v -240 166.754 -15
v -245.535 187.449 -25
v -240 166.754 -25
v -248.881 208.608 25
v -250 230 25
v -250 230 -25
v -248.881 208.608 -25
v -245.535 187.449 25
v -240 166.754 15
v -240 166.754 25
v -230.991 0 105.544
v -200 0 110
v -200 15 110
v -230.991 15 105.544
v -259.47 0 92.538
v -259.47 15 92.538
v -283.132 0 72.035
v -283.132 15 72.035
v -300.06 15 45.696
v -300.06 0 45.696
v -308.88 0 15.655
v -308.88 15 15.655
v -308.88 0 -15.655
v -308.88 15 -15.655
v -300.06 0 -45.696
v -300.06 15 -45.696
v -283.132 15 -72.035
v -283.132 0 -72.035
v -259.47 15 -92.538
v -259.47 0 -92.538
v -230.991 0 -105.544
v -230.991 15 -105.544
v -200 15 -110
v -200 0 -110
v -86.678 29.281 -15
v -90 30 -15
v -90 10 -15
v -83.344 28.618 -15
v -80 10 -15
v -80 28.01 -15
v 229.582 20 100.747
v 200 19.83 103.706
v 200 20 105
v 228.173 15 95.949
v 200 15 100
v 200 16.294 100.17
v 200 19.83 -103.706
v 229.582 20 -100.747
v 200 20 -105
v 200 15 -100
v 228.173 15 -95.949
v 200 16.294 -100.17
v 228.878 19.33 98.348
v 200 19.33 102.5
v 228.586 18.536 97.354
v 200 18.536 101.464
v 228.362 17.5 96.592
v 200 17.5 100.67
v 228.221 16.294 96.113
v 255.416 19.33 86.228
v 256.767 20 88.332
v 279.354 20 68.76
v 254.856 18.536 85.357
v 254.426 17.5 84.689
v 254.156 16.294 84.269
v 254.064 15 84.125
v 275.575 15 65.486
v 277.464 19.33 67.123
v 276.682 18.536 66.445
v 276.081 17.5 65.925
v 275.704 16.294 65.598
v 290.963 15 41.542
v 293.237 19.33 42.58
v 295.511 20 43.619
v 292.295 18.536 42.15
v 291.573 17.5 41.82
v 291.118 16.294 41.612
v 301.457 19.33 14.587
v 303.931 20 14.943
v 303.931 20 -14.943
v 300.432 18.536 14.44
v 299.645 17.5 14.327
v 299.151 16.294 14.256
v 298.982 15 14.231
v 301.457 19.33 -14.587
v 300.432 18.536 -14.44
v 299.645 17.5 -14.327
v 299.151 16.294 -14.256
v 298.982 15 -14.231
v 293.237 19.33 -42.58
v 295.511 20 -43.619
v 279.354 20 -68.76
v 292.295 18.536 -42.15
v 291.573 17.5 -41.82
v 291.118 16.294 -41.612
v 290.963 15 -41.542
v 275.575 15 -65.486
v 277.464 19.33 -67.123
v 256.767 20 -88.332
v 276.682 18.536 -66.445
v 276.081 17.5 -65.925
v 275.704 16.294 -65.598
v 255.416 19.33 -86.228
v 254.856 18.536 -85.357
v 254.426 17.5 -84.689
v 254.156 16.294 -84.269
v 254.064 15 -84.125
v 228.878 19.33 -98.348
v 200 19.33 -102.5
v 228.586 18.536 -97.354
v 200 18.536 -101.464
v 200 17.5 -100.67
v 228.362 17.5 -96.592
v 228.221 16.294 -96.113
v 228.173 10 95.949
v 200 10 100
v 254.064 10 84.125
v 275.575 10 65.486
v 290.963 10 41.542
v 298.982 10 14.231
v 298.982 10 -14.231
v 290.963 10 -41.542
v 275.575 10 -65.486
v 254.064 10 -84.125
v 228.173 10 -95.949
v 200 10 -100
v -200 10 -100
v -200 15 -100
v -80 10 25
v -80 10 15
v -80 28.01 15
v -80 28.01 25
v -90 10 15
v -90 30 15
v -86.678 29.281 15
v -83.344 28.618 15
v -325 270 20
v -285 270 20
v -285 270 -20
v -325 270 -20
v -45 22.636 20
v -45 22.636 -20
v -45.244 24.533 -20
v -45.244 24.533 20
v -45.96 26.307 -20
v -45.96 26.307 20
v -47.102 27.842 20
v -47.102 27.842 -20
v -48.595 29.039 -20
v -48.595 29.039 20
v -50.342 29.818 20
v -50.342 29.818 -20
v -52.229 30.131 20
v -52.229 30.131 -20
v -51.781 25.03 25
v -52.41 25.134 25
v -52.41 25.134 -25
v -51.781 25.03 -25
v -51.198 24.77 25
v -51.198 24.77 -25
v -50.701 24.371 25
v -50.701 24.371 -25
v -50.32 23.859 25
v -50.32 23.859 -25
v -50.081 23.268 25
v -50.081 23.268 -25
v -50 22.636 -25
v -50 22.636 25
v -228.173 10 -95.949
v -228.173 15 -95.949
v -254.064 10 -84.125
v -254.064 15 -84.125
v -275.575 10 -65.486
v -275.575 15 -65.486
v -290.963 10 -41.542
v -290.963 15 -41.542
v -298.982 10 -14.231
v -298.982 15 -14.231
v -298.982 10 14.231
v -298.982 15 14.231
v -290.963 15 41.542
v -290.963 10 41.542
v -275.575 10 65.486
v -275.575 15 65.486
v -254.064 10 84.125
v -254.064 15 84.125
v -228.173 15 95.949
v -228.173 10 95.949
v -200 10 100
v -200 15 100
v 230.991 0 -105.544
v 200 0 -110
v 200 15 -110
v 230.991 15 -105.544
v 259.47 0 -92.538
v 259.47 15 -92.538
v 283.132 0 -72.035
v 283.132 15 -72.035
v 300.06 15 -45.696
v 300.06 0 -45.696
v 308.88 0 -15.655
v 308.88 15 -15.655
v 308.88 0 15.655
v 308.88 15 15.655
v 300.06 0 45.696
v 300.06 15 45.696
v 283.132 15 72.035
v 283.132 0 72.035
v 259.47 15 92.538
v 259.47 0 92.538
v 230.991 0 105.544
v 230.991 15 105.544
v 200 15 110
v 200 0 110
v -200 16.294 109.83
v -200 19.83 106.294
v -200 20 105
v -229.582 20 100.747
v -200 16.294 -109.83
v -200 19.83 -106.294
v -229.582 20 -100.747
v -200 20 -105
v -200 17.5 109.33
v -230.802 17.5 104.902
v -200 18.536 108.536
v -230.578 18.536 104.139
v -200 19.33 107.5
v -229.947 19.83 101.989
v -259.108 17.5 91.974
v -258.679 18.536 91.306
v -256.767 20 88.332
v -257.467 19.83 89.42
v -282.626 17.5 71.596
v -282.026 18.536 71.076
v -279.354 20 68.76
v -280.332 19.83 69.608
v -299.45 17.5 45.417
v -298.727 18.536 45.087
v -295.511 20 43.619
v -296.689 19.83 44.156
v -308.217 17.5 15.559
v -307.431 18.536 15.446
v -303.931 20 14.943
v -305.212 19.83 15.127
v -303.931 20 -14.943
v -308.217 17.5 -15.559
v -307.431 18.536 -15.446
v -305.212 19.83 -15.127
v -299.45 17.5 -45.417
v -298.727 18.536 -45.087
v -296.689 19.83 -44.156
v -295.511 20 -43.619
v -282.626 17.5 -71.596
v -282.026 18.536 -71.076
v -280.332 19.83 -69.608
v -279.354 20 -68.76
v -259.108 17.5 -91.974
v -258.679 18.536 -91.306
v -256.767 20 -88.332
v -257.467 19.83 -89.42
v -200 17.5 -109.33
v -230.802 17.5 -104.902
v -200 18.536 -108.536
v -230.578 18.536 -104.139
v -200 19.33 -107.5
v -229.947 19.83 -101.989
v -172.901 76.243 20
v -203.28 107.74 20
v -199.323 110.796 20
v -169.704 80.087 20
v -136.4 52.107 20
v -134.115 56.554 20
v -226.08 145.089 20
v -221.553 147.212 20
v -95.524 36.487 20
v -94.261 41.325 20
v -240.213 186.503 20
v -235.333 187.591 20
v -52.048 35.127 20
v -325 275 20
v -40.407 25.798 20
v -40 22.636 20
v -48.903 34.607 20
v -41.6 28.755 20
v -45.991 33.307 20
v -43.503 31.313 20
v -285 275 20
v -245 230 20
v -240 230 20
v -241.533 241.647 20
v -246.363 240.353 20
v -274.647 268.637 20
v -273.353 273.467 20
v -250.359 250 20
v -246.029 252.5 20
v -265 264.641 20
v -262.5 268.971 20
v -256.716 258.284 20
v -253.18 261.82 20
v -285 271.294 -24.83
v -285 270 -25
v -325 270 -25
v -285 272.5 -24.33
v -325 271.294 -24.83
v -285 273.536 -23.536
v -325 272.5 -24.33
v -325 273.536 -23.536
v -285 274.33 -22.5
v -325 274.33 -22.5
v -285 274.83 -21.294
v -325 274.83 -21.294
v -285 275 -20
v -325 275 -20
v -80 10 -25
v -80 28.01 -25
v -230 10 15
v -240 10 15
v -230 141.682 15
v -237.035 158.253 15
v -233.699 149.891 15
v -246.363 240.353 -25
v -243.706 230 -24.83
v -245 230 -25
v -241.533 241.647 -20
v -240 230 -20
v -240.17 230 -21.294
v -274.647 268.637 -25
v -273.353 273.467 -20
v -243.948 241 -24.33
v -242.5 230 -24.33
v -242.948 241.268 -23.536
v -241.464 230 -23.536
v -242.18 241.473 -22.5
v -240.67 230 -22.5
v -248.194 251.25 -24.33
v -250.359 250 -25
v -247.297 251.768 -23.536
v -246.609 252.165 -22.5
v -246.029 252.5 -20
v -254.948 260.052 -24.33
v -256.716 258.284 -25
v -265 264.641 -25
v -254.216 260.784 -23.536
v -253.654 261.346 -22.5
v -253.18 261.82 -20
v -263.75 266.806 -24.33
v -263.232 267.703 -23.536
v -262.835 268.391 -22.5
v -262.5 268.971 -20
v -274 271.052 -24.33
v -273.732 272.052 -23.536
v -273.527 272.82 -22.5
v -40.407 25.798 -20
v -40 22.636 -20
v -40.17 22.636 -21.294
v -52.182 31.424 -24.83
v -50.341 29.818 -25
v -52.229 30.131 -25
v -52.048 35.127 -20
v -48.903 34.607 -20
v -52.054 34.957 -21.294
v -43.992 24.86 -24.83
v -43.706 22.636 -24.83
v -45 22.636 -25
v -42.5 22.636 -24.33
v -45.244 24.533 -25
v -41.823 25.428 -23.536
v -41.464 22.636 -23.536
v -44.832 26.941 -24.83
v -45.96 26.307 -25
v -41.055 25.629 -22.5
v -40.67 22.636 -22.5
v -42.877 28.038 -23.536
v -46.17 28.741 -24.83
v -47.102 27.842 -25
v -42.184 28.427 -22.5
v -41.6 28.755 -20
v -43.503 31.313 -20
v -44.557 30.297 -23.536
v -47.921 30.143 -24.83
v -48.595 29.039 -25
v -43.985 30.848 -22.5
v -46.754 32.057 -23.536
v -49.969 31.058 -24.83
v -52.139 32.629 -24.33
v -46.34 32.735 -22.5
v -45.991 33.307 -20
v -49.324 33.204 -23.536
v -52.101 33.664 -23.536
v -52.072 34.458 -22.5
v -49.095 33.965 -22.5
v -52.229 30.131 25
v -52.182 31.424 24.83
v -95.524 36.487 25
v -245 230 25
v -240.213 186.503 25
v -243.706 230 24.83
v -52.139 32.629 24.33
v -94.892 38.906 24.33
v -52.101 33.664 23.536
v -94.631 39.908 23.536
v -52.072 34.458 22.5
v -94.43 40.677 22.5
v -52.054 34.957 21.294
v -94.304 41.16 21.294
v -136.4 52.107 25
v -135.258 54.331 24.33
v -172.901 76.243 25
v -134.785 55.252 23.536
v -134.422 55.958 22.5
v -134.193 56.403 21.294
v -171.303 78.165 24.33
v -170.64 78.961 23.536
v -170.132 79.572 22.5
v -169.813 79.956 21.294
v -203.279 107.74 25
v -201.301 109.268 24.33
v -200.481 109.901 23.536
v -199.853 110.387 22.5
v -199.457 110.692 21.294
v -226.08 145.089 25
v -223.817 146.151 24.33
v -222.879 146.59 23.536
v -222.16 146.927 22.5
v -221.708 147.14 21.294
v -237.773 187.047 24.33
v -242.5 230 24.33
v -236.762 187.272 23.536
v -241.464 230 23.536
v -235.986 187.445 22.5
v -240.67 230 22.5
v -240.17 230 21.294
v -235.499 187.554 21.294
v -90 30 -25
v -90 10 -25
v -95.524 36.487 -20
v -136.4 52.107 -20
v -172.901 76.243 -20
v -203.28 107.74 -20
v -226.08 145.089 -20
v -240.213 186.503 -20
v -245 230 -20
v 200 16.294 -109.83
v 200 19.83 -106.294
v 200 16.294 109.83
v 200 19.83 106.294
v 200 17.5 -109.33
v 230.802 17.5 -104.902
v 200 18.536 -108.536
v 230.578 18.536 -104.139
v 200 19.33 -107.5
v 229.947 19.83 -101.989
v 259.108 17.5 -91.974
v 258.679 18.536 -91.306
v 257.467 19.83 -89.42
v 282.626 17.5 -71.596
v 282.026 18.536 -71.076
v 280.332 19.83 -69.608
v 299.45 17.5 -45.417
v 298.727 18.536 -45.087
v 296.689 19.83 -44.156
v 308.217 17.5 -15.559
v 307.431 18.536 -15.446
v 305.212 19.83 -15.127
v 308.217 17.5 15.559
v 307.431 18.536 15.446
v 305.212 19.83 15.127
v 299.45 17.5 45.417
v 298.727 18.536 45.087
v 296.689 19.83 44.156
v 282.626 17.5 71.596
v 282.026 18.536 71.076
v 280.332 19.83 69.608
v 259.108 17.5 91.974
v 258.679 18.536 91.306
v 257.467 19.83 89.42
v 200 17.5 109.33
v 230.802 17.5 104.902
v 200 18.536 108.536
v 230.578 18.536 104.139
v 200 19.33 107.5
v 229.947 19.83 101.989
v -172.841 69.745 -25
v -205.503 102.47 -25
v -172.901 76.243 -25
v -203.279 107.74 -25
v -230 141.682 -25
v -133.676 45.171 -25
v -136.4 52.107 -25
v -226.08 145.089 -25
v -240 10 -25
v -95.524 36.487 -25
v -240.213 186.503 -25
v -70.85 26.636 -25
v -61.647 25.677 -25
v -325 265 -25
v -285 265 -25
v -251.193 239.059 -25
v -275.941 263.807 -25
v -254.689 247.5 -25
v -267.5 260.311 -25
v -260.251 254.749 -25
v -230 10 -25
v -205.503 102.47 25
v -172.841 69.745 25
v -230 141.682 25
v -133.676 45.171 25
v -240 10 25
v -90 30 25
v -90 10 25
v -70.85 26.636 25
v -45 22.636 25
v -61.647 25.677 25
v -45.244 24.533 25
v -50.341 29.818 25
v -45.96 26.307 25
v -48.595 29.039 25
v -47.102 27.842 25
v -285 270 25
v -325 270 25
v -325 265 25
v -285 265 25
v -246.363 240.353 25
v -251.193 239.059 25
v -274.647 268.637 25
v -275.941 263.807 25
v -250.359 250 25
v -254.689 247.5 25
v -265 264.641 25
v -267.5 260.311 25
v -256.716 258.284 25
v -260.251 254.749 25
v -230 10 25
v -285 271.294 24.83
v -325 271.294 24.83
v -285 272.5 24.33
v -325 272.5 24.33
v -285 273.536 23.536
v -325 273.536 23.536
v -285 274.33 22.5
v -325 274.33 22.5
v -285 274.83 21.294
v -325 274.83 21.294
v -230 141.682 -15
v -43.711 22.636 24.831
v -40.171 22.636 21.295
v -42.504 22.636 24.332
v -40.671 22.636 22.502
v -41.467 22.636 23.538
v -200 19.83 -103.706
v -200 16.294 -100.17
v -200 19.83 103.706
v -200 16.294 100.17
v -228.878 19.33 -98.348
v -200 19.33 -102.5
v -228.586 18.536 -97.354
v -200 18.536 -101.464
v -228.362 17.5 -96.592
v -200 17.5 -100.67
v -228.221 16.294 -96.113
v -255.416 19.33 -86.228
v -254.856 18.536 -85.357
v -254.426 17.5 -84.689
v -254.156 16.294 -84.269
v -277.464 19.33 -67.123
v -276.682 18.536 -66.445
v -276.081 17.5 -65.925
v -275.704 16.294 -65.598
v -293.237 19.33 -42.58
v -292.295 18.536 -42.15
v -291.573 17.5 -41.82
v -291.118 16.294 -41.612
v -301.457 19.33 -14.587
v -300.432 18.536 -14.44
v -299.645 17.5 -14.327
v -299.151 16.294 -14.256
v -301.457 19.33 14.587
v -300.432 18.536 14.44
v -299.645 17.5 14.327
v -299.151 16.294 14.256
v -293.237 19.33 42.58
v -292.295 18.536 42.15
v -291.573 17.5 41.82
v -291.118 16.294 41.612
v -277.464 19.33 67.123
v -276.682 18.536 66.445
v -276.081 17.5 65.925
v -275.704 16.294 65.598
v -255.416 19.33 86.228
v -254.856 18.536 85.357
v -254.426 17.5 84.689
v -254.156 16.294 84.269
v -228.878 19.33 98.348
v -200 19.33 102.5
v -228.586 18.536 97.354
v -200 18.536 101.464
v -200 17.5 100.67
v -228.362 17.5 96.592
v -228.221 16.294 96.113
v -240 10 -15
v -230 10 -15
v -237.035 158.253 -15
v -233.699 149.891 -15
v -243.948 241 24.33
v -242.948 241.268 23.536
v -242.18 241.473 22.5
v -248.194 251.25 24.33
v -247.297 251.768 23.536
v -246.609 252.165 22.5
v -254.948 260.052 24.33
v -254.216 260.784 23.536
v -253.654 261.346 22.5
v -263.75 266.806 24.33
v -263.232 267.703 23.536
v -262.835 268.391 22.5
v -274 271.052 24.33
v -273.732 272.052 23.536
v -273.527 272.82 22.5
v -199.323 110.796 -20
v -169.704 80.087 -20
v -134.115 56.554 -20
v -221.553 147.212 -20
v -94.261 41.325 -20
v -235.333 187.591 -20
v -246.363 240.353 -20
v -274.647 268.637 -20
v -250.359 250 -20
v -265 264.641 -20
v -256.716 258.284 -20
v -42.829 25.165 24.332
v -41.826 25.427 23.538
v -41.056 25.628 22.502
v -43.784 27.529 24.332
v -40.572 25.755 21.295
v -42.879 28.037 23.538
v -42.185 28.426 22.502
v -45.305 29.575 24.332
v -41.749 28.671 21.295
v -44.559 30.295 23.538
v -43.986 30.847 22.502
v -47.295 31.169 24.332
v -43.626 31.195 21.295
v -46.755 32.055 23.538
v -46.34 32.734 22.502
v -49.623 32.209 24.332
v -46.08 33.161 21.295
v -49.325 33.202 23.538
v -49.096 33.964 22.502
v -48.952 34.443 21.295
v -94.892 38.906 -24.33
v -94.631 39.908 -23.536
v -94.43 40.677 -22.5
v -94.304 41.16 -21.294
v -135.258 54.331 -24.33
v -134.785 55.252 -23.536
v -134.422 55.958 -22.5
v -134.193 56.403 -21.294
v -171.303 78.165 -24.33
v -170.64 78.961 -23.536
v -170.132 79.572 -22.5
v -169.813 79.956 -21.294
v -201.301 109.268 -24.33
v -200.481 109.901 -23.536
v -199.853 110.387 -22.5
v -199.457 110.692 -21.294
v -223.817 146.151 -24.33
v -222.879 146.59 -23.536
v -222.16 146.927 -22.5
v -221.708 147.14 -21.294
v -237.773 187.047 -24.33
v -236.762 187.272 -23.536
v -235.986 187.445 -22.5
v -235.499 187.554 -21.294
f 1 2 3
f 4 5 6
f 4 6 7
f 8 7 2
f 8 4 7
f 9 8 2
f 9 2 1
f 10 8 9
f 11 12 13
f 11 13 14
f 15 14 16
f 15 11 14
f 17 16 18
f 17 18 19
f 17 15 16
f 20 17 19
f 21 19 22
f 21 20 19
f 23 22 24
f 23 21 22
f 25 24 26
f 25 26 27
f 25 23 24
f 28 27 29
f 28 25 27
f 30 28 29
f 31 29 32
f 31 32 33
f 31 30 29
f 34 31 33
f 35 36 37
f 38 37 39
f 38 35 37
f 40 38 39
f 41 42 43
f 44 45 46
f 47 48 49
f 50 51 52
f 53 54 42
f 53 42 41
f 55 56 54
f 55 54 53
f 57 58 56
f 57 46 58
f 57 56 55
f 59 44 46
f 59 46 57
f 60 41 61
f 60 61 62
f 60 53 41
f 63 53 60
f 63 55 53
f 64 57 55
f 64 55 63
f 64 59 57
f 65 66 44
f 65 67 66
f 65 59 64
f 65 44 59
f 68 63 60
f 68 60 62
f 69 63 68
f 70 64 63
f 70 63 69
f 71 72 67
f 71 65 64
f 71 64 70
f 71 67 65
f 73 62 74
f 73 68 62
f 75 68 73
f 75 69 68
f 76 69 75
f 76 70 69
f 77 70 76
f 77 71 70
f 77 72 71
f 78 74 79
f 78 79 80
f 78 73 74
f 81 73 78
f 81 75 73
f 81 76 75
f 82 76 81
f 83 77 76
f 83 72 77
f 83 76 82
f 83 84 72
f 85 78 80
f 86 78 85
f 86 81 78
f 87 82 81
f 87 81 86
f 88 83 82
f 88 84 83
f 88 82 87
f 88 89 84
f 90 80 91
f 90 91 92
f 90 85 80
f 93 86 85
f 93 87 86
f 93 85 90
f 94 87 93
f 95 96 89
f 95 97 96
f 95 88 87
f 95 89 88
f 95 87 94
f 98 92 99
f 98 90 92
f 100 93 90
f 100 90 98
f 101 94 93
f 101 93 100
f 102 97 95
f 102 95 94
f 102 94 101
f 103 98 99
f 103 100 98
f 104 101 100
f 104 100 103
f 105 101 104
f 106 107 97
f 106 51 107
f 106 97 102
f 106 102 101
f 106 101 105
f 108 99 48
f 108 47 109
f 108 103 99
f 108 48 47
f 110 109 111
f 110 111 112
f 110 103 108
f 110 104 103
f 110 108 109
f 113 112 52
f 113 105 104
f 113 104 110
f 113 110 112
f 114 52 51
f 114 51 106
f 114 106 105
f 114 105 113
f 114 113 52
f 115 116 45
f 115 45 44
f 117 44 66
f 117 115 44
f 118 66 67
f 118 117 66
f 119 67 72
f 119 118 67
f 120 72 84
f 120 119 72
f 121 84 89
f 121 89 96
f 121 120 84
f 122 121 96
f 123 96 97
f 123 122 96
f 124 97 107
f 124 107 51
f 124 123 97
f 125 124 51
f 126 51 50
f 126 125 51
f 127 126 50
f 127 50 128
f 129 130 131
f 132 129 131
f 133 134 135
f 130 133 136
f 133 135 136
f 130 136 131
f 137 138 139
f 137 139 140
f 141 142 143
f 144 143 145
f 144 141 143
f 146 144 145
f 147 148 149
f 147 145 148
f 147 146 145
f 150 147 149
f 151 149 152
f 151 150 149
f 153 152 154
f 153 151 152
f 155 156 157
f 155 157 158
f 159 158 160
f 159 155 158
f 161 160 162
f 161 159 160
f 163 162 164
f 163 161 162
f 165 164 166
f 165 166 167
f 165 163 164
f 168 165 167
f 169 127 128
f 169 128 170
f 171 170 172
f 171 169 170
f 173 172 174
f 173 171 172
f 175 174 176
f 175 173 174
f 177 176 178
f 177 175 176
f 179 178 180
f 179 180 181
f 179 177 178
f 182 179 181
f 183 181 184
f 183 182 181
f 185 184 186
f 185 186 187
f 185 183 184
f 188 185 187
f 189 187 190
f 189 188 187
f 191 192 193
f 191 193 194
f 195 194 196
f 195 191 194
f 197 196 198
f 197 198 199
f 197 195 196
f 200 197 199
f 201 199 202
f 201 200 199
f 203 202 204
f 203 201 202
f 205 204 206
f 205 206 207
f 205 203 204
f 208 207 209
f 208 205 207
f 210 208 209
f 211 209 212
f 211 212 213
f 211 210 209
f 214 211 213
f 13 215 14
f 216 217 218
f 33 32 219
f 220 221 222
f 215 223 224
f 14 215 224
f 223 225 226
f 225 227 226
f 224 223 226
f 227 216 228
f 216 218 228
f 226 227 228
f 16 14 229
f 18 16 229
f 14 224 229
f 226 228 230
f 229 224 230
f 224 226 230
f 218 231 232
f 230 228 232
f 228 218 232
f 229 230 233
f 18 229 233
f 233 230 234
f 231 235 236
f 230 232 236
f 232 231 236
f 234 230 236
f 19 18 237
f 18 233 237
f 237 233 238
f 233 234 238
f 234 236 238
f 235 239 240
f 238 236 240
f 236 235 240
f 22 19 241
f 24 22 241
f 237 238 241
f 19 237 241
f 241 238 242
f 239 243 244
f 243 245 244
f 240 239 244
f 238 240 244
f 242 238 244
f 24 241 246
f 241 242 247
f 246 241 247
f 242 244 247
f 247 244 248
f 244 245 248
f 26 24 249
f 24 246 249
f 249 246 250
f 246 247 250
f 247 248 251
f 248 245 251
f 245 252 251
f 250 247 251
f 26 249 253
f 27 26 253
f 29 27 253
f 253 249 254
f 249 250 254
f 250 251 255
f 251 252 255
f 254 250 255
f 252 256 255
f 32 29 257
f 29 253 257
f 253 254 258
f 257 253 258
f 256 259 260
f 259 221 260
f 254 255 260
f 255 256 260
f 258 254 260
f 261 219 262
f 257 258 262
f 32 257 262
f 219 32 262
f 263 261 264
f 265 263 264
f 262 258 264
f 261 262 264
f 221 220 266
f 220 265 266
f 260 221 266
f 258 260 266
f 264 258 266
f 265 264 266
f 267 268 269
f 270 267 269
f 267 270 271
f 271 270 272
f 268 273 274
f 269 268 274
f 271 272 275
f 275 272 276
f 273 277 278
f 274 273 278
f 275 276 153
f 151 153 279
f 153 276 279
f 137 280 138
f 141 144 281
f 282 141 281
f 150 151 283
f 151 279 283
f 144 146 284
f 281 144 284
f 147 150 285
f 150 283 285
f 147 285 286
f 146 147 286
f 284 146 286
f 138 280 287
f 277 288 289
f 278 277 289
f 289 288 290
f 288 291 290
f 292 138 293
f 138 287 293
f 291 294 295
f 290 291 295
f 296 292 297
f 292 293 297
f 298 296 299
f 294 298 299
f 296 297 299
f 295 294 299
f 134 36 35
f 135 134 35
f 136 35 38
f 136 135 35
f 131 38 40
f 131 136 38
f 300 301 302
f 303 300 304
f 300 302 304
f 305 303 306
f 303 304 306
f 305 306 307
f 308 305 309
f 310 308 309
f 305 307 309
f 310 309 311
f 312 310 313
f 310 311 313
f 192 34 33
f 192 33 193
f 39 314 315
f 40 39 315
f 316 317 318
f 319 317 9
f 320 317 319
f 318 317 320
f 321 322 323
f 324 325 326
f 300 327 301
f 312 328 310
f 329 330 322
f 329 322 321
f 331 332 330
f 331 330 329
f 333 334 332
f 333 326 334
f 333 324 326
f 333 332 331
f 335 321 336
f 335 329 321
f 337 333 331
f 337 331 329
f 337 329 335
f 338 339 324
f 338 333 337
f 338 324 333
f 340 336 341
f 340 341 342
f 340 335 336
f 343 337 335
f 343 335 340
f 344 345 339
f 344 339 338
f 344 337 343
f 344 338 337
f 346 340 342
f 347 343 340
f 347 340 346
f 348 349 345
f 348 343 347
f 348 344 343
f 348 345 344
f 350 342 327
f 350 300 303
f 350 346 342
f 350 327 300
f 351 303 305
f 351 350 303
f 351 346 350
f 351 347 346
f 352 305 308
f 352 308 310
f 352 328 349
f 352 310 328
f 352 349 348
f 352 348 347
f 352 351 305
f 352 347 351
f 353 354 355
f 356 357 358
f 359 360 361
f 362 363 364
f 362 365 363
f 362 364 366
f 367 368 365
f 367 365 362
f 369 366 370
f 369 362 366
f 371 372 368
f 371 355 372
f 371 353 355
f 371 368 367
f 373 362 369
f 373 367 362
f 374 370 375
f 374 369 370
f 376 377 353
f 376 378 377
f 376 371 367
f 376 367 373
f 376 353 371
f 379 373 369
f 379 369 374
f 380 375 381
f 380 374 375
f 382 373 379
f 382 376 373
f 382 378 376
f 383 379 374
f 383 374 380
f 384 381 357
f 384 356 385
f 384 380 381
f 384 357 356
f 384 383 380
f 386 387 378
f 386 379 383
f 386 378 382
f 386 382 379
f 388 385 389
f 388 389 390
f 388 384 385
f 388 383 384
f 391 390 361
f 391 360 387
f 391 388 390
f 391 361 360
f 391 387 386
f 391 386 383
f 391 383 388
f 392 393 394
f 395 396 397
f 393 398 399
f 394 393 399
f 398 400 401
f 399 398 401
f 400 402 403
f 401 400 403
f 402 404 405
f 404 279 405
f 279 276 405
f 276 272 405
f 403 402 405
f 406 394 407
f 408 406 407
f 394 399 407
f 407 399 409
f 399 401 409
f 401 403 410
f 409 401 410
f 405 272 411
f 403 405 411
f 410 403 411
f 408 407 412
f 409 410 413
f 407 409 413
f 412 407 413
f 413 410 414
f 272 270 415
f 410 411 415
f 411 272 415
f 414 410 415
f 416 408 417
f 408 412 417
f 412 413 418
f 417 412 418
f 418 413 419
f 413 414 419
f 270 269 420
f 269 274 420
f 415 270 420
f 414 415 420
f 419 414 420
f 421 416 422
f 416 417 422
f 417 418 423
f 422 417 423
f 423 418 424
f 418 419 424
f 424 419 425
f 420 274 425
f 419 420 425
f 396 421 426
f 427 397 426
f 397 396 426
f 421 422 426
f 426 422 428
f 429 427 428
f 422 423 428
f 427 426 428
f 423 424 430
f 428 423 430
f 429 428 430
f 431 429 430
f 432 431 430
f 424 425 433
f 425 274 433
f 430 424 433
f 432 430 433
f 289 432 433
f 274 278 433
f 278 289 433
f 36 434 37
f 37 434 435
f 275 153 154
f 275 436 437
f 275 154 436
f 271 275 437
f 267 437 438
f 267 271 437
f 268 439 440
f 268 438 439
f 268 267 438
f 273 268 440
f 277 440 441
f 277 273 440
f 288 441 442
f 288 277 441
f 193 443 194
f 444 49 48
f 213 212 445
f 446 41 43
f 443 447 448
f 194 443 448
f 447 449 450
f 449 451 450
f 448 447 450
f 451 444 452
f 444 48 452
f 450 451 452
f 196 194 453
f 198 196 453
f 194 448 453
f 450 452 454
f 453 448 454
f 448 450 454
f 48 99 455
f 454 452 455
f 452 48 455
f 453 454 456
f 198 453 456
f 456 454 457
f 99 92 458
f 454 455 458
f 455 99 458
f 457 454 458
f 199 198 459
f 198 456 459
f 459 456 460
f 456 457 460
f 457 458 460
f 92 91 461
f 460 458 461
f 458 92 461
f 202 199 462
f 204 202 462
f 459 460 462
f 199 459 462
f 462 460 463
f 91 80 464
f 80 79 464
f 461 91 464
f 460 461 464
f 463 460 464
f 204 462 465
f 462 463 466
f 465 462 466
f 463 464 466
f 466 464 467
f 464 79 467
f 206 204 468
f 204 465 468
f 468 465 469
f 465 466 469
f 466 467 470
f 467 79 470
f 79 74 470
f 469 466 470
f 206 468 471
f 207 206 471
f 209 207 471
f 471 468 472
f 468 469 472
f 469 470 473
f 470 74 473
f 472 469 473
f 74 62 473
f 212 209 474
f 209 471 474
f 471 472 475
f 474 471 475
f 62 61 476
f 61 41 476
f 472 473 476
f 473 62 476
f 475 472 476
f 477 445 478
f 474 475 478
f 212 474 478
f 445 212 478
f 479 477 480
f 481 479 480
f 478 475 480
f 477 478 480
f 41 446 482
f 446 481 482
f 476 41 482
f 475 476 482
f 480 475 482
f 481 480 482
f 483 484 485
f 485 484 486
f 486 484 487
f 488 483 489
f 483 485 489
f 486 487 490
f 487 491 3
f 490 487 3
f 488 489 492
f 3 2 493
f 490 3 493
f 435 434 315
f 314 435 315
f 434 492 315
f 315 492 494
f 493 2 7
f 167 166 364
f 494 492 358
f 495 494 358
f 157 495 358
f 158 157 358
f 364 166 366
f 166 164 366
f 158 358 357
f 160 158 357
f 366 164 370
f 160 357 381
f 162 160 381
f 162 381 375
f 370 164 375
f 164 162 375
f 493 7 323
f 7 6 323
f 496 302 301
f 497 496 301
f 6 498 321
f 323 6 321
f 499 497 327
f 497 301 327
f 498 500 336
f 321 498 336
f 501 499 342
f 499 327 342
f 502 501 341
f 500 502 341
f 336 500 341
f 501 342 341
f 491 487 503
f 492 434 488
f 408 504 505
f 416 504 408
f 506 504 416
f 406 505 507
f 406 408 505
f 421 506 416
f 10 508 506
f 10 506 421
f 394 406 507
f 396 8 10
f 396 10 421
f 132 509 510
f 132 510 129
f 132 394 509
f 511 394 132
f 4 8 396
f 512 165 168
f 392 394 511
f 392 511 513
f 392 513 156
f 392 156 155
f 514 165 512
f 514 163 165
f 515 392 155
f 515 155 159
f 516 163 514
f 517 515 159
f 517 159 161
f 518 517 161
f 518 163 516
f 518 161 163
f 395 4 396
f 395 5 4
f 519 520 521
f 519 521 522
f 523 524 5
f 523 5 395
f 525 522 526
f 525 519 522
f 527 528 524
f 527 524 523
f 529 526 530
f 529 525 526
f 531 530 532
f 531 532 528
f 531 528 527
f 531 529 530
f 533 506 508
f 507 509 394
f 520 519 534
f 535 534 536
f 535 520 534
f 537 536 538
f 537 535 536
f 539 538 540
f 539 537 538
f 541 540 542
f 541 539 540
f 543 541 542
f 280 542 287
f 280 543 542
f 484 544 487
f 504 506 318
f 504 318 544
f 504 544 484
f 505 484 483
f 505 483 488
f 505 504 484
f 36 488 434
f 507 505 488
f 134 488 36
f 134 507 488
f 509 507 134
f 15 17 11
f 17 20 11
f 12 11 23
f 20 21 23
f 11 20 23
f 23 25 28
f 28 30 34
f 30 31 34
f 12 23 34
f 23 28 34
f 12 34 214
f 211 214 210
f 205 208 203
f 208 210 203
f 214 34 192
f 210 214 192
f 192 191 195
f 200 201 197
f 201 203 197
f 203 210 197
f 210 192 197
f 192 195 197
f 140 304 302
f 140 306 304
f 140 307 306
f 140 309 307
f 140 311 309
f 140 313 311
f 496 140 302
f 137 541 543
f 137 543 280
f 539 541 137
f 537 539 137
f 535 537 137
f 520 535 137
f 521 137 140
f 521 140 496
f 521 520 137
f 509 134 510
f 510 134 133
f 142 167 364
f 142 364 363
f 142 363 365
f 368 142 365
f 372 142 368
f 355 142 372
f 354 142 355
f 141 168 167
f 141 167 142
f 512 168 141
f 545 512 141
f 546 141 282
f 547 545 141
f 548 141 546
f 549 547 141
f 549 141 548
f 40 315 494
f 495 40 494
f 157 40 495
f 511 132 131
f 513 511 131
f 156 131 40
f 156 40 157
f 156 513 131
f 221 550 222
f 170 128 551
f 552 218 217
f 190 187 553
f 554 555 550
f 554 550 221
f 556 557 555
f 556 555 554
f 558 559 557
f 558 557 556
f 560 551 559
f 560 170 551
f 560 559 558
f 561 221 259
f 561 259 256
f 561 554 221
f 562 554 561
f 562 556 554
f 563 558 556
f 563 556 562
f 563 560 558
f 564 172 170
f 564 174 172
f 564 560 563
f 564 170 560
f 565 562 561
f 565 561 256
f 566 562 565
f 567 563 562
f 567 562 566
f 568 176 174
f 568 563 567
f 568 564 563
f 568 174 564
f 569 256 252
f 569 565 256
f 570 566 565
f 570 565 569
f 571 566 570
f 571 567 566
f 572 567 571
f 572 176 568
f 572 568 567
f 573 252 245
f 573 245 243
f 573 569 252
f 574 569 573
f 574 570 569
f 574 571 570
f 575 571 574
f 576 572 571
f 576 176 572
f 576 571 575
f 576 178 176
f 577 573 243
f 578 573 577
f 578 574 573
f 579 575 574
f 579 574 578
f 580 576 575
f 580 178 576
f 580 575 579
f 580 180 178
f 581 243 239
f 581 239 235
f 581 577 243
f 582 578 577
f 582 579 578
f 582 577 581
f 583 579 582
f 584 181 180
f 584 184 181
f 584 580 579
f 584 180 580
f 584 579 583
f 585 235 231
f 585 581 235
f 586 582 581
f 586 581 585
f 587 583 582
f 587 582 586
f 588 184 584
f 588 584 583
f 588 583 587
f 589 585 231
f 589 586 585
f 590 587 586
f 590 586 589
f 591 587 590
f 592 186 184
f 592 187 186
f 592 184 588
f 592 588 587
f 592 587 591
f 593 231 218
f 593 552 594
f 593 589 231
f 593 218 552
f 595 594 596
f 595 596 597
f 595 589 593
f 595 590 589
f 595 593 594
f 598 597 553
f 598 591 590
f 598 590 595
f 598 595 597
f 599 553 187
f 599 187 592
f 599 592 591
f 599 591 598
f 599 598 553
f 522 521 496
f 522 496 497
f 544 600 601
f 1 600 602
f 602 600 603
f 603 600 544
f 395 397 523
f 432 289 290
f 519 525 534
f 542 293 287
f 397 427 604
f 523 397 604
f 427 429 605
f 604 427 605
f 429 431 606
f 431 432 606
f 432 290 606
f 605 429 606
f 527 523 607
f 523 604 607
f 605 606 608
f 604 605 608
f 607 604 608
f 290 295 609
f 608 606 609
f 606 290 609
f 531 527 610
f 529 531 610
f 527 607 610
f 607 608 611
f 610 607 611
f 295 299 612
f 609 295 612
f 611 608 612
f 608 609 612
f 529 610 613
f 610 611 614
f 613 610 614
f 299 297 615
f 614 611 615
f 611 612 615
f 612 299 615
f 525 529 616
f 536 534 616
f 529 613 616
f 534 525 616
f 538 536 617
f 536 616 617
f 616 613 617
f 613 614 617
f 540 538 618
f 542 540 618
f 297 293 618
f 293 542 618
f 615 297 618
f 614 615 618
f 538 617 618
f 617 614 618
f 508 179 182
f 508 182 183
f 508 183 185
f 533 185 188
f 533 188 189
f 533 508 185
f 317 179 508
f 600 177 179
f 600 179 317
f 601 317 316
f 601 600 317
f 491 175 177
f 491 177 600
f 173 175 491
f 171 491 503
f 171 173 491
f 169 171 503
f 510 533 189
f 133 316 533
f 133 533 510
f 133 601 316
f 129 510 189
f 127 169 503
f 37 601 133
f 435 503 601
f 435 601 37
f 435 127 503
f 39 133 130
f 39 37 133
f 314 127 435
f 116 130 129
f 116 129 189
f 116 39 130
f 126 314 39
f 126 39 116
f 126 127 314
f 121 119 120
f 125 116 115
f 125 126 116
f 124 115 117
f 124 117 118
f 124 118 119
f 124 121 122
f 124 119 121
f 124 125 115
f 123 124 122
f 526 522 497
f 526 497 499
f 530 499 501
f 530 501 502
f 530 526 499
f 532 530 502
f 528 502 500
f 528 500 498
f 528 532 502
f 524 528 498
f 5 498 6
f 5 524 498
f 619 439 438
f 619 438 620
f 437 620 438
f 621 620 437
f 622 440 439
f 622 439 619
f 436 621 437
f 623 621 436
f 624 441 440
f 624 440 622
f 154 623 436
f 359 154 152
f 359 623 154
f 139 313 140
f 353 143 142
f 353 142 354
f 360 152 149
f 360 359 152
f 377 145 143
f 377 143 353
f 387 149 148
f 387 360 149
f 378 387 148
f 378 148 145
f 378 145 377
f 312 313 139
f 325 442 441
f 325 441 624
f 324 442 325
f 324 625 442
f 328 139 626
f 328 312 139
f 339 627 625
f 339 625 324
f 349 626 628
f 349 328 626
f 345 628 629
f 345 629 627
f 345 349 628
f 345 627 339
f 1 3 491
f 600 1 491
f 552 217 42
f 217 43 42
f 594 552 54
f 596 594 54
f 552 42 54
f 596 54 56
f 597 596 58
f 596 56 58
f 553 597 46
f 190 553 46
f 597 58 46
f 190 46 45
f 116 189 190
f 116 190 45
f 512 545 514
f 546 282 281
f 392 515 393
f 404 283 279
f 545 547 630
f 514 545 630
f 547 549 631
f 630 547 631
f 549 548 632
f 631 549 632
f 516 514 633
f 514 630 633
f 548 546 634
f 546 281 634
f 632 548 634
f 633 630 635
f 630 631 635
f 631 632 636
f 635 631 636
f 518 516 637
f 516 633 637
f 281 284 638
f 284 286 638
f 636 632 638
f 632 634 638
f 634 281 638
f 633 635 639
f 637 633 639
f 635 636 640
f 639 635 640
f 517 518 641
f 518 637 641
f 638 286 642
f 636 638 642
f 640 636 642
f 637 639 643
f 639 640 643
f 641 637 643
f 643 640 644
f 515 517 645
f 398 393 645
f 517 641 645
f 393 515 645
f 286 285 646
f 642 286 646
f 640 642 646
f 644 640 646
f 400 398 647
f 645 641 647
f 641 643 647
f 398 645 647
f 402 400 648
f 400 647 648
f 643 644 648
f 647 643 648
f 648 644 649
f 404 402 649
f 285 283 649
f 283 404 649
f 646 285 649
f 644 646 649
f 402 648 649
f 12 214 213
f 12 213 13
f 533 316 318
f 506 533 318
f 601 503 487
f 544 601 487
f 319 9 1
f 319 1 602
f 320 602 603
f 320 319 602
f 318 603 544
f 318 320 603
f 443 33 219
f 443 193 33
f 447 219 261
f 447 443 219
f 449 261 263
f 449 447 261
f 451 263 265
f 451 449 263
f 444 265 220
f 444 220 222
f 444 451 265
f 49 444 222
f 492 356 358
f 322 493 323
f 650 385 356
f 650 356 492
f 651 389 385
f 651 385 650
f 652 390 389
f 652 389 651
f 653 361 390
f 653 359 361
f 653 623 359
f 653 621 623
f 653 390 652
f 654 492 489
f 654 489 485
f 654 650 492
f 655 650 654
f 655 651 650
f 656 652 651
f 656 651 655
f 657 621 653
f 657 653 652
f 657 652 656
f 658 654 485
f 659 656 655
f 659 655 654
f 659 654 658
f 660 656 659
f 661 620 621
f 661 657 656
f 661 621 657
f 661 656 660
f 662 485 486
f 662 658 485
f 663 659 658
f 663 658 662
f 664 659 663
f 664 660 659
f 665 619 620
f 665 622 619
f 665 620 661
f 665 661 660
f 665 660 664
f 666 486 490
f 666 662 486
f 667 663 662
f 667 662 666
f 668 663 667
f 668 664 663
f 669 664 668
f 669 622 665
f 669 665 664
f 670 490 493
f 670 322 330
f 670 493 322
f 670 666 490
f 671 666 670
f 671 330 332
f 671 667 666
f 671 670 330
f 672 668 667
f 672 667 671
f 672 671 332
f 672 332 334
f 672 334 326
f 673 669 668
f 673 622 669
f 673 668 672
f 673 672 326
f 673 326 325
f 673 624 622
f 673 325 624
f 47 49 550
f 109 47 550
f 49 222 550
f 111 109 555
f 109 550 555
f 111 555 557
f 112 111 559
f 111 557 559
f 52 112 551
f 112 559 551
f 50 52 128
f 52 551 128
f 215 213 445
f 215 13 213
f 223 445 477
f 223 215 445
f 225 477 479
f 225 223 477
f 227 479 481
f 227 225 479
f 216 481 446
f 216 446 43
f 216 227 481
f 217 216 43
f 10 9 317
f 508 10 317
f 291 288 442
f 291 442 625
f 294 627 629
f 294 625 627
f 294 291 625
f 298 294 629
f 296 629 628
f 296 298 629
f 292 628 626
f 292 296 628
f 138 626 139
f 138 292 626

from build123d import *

# Parameters (mm, degrees)
SKETCH_1_W      = 4
SKETCH_1_H      = 6
EXTRUDE_1_DEPTH = 10
EXTRUDE_2_DEPTH = 20
SKETCH_1_4_W    = 4
SKETCH_1_4_H    = 6
EXTRUDE_3_DEPTH = 10
FILLET_1_R      = 5
EXTRUDE_4_DEPTH = 25
EXTRUDE_START   = 25
EXTRUDE_5_DEPTH = 5
EXTRUDE_START_2 = -25
EXTRUDE_6_DEPTH = 5
EXTRUDE_START_3 = 15
EXTRUDE_7_DEPTH = 10
EXTRUDE_8_DEPTH = 10
FILLET_2_R      = 5


with BuildPart() as part:
    # Эскиз1 → Бобышка-Вытянуть1 (new body)
    with BuildSketch(Plane(origin=(0, 0, 0), x_dir=(1, 0, 0), z_dir=(0, 1, 0))):
        with BuildLine():
            Line((-200, -100), (200, -100))
            ThreePointArc((200, -100), (300, 0), (200, 100))
            Line((200, 100), (-200, 100))
            ThreePointArc((-200, 100), (-300, 0), (-200, -100))
        make_face()
        with Locations((-242, 18)):
            Rectangle(SKETCH_1_W, SKETCH_1_H, mode=Mode.SUBTRACT)
        with Locations((-242, -18)):
            Rectangle(SKETCH_1_W, SKETCH_1_H, mode=Mode.SUBTRACT)
    extrude(amount=EXTRUDE_1_DEPTH)

    # Эскиз1<3> → Бобышка-Вытянуть2 (add)
    with BuildSketch(Plane(origin=(0, 0, 0), x_dir=(1, 0, 0), z_dir=(0, 1, 0))):
        with BuildLine():
            Line((-200, 110), (200, 110))
            ThreePointArc((200, 110), (310, 0), (200, -110))
            Line((200, -110), (-200, -110))
            ThreePointArc((-200, -110), (-310, 0), (-200, 110))
        make_face()
        with BuildLine():
            ThreePointArc((200, -100), (300, 0), (200, 100))
            Line((200, 100), (-200, 100))
            ThreePointArc((-200, 100), (-300, 0), (-200, -100))
            Line((-200, -100), (200, -100))
        make_face(mode=Mode.SUBTRACT)
    extrude(amount=EXTRUDE_2_DEPTH)

    # Эскиз1<4> → Бобышка-Вытянуть3 (add)
    with BuildSketch(Plane(origin=(0, 0, 0), x_dir=(1, 0, 0), z_dir=(0, 1, 0))):
        with Locations((-242, 18)):
            Rectangle(SKETCH_1_4_W, SKETCH_1_4_H)
        with Locations((-242, -18)):
            Rectangle(SKETCH_1_4_W, SKETCH_1_4_H)
    extrude(amount=EXTRUDE_3_DEPTH)

    # Скругление1
    fillet_1_edges = [part.edges().sort_by_distance(p)[0] for p in [
        (0, 20, -110),
        (300, 20, 0),
        (0, 20, 100),
        (-300, 20, 0),
        (0, 20, -100),
        (-310, 20, 0),
        (0, 20, 110),
        (310, 20, 0),
    ]]
    fillet(fillet_1_edges, radius=FILLET_1_R - 0.0001)  # a hair under: the kernel refuses the full size



with BuildPart() as body_2:
    # Эскиз2 → Бобышка-Вытянуть4 (new, symmetric)
    with BuildSketch(Plane.XY):
        with BuildLine():
            ThreePointArc((-245, 230), (-256.715728753, 258.284271247), (-285, 270))
            Line((-285, 270), (-325, 270))
            Line((-325, 270), (-325, 265))
            Line((-325, 265), (-285, 265))
            ThreePointArc((-285, 265), (-260.251262658, 254.748737342), (-250, 230))
            ThreePointArc((-250, 230), (-247.484567313, 197.984378813), (-240, 166.754446797))
            ThreePointArc((-240, 166.754446797), (-235.413108769, 154.053650458), (-230, 141.682391337))
            ThreePointArc((-230, 141.682391337), (-172.840678712, 69.744700973), (-90, 30))
            ThreePointArc((-90, 30), (-85.012374627, 28.942769648), (-80, 28.009901233))
            ThreePointArc((-80, 28.009901233), (-66.253520421, 26.104713469), (-52.409638554, 25.133952895))
            ThreePointArc((-52.409638554, 25.133952895), (-50.700569032, 24.371111803), (-50, 22.635586467))
            Line((-50, 22.635586467), (-45, 22.635586467))
            ThreePointArc((-45, 22.635586467), (-47.101707097, 27.842162475), (-52.228915663, 30.130685751))
            ThreePointArc((-52.228915663, 30.130685751), (-188.95447741, 91.1579731), (-245, 230))
        make_face()
    extrude(amount=EXTRUDE_4_DEPTH, both=True)


with BuildPart() as body_3:
    # Эскиз2<4> → Бобышка-Вытянуть5 (new body)
    with BuildSketch(Plane.XY.offset(EXTRUDE_START)):
        with BuildLine():
            Line((-325, 270), (-285, 270))
            ThreePointArc((-285, 270), (-256.715728753, 258.284271247), (-245, 230))
            ThreePointArc((-245, 230), (-188.95447741, 91.1579731), (-52.228915663, 30.130685751))
            ThreePointArc((-52.228915663, 30.130685751), (-47.101707097, 27.842162475), (-45, 22.635586467))
            Line((-45, 22.635586467), (-40, 22.635586467))
            ThreePointArc((-40, 22.635586467), (-43.502845162, 31.313213148), (-52.048192771, 35.127418607))
            ThreePointArc((-52.048192771, 35.127418607), (-185.355615474, 94.629023772), (-240, 230))
            ThreePointArc((-240, 230), (-253.180194847, 261.819805153), (-285, 275))
            Line((-285, 275), (-325, 275))
            Line((-325, 275), (-325, 270))
        make_face()
    extrude(amount=-EXTRUDE_5_DEPTH)


with BuildPart() as body_4:
    # Эскиз2<5> → Бобышка-Вытянуть6 (new body)
    with BuildSketch(Plane.XY.offset(EXTRUDE_START_2)):
        with BuildLine():
            Line((-325, 270), (-285, 270))
            ThreePointArc((-285, 270), (-256.715728753, 258.284271247), (-245, 230))
            ThreePointArc((-245, 230), (-188.95447741, 91.1579731), (-52.228915663, 30.130685751))
            ThreePointArc((-52.228915663, 30.130685751), (-47.101707097, 27.842162475), (-45, 22.635586467))
            Line((-45, 22.635586467), (-40, 22.635586467))
            ThreePointArc((-40, 22.635586467), (-43.502845162, 31.313213148), (-52.048192771, 35.127418607))
            ThreePointArc((-52.048192771, 35.127418607), (-185.355615474, 94.629023772), (-240, 230))
            ThreePointArc((-240, 230), (-253.180194847, 261.819805153), (-285, 275))
            Line((-285, 275), (-325, 275))
            Line((-325, 275), (-325, 270))
        make_face()
    extrude(amount=EXTRUDE_6_DEPTH)



with BuildPart() as part_1:
    add(part.part)

    add(body_2.part)  # Бобышка-Вытянуть7 merges body 2

    add(body_3.part)  # Бобышка-Вытянуть7 merges body 3
    # Эскиз2<8> → Бобышка-Вытянуть7 (add)
    with BuildSketch(Plane.XY.offset(EXTRUDE_START_3)):
        with BuildLine():
            ThreePointArc((-230, 141.682391337), (-235.413108769, 154.053650458), (-240, 166.754446797))
            Line((-240, 166.754446797), (-240, 0))
            Line((-240, 0), (-230, 0))
            Line((-230, 0), (-230, 141.682391337))
        make_face()
        with BuildLine():
            Line((-80, 0), (-80, 28.009901233))
            ThreePointArc((-80, 28.009901233), (-85.012374627, 28.942769648), (-90, 30))
            Line((-90, 30), (-90, 0))
            Line((-90, 0), (-80, 0))
        make_face()
    extrude(amount=EXTRUDE_7_DEPTH)


with BuildPart() as body_4_1:
    add(body_4.part)

    add(part_1.part)  # Бобышка-Вытянуть8 merges part
    # Эскиз2<9> → Бобышка-Вытянуть8 (add)
    with BuildSketch(Plane.XY.offset(EXTRUDE_START_2)):
        with BuildLine():
            ThreePointArc((-230, 141.682391337), (-235.413108769, 154.053650458), (-240, 166.754446797))
            Line((-240, 166.754446797), (-240, 0))
            Line((-240, 0), (-230, 0))
            Line((-230, 0), (-230, 141.682391337))
        make_face()
        with BuildLine():
            Line((-80, 0), (-80, 28.009901233))
            ThreePointArc((-80, 28.009901233), (-85.012374627, 28.942769648), (-90, 30))
            Line((-90, 30), (-90, 0))
            Line((-90, 0), (-80, 0))
        make_face()
    extrude(amount=EXTRUDE_8_DEPTH)

    # Скругление2
    fillet_2_edges = [body_4_1.edges().sort_by_distance(p)[0] for p in [
        (-305, 275, -25),
        (-253.180194847, 261.819805153, -25),
        (-43.502845162, 31.313213148, -25),
        (-305, 275, 25),
        (-253.180194847, 261.819805153, 25),
        (-43.502845162, 31.313213148, 25),
        (-185.355615474, 94.629023772, -25),
        (-185.355615474, 94.629023772, 25),
    ]]
    fillet(fillet_2_edges, radius=FILLET_2_R - 0.0001)  # a hair under: the kernel refuses the full size


solid = body_4_1.part
